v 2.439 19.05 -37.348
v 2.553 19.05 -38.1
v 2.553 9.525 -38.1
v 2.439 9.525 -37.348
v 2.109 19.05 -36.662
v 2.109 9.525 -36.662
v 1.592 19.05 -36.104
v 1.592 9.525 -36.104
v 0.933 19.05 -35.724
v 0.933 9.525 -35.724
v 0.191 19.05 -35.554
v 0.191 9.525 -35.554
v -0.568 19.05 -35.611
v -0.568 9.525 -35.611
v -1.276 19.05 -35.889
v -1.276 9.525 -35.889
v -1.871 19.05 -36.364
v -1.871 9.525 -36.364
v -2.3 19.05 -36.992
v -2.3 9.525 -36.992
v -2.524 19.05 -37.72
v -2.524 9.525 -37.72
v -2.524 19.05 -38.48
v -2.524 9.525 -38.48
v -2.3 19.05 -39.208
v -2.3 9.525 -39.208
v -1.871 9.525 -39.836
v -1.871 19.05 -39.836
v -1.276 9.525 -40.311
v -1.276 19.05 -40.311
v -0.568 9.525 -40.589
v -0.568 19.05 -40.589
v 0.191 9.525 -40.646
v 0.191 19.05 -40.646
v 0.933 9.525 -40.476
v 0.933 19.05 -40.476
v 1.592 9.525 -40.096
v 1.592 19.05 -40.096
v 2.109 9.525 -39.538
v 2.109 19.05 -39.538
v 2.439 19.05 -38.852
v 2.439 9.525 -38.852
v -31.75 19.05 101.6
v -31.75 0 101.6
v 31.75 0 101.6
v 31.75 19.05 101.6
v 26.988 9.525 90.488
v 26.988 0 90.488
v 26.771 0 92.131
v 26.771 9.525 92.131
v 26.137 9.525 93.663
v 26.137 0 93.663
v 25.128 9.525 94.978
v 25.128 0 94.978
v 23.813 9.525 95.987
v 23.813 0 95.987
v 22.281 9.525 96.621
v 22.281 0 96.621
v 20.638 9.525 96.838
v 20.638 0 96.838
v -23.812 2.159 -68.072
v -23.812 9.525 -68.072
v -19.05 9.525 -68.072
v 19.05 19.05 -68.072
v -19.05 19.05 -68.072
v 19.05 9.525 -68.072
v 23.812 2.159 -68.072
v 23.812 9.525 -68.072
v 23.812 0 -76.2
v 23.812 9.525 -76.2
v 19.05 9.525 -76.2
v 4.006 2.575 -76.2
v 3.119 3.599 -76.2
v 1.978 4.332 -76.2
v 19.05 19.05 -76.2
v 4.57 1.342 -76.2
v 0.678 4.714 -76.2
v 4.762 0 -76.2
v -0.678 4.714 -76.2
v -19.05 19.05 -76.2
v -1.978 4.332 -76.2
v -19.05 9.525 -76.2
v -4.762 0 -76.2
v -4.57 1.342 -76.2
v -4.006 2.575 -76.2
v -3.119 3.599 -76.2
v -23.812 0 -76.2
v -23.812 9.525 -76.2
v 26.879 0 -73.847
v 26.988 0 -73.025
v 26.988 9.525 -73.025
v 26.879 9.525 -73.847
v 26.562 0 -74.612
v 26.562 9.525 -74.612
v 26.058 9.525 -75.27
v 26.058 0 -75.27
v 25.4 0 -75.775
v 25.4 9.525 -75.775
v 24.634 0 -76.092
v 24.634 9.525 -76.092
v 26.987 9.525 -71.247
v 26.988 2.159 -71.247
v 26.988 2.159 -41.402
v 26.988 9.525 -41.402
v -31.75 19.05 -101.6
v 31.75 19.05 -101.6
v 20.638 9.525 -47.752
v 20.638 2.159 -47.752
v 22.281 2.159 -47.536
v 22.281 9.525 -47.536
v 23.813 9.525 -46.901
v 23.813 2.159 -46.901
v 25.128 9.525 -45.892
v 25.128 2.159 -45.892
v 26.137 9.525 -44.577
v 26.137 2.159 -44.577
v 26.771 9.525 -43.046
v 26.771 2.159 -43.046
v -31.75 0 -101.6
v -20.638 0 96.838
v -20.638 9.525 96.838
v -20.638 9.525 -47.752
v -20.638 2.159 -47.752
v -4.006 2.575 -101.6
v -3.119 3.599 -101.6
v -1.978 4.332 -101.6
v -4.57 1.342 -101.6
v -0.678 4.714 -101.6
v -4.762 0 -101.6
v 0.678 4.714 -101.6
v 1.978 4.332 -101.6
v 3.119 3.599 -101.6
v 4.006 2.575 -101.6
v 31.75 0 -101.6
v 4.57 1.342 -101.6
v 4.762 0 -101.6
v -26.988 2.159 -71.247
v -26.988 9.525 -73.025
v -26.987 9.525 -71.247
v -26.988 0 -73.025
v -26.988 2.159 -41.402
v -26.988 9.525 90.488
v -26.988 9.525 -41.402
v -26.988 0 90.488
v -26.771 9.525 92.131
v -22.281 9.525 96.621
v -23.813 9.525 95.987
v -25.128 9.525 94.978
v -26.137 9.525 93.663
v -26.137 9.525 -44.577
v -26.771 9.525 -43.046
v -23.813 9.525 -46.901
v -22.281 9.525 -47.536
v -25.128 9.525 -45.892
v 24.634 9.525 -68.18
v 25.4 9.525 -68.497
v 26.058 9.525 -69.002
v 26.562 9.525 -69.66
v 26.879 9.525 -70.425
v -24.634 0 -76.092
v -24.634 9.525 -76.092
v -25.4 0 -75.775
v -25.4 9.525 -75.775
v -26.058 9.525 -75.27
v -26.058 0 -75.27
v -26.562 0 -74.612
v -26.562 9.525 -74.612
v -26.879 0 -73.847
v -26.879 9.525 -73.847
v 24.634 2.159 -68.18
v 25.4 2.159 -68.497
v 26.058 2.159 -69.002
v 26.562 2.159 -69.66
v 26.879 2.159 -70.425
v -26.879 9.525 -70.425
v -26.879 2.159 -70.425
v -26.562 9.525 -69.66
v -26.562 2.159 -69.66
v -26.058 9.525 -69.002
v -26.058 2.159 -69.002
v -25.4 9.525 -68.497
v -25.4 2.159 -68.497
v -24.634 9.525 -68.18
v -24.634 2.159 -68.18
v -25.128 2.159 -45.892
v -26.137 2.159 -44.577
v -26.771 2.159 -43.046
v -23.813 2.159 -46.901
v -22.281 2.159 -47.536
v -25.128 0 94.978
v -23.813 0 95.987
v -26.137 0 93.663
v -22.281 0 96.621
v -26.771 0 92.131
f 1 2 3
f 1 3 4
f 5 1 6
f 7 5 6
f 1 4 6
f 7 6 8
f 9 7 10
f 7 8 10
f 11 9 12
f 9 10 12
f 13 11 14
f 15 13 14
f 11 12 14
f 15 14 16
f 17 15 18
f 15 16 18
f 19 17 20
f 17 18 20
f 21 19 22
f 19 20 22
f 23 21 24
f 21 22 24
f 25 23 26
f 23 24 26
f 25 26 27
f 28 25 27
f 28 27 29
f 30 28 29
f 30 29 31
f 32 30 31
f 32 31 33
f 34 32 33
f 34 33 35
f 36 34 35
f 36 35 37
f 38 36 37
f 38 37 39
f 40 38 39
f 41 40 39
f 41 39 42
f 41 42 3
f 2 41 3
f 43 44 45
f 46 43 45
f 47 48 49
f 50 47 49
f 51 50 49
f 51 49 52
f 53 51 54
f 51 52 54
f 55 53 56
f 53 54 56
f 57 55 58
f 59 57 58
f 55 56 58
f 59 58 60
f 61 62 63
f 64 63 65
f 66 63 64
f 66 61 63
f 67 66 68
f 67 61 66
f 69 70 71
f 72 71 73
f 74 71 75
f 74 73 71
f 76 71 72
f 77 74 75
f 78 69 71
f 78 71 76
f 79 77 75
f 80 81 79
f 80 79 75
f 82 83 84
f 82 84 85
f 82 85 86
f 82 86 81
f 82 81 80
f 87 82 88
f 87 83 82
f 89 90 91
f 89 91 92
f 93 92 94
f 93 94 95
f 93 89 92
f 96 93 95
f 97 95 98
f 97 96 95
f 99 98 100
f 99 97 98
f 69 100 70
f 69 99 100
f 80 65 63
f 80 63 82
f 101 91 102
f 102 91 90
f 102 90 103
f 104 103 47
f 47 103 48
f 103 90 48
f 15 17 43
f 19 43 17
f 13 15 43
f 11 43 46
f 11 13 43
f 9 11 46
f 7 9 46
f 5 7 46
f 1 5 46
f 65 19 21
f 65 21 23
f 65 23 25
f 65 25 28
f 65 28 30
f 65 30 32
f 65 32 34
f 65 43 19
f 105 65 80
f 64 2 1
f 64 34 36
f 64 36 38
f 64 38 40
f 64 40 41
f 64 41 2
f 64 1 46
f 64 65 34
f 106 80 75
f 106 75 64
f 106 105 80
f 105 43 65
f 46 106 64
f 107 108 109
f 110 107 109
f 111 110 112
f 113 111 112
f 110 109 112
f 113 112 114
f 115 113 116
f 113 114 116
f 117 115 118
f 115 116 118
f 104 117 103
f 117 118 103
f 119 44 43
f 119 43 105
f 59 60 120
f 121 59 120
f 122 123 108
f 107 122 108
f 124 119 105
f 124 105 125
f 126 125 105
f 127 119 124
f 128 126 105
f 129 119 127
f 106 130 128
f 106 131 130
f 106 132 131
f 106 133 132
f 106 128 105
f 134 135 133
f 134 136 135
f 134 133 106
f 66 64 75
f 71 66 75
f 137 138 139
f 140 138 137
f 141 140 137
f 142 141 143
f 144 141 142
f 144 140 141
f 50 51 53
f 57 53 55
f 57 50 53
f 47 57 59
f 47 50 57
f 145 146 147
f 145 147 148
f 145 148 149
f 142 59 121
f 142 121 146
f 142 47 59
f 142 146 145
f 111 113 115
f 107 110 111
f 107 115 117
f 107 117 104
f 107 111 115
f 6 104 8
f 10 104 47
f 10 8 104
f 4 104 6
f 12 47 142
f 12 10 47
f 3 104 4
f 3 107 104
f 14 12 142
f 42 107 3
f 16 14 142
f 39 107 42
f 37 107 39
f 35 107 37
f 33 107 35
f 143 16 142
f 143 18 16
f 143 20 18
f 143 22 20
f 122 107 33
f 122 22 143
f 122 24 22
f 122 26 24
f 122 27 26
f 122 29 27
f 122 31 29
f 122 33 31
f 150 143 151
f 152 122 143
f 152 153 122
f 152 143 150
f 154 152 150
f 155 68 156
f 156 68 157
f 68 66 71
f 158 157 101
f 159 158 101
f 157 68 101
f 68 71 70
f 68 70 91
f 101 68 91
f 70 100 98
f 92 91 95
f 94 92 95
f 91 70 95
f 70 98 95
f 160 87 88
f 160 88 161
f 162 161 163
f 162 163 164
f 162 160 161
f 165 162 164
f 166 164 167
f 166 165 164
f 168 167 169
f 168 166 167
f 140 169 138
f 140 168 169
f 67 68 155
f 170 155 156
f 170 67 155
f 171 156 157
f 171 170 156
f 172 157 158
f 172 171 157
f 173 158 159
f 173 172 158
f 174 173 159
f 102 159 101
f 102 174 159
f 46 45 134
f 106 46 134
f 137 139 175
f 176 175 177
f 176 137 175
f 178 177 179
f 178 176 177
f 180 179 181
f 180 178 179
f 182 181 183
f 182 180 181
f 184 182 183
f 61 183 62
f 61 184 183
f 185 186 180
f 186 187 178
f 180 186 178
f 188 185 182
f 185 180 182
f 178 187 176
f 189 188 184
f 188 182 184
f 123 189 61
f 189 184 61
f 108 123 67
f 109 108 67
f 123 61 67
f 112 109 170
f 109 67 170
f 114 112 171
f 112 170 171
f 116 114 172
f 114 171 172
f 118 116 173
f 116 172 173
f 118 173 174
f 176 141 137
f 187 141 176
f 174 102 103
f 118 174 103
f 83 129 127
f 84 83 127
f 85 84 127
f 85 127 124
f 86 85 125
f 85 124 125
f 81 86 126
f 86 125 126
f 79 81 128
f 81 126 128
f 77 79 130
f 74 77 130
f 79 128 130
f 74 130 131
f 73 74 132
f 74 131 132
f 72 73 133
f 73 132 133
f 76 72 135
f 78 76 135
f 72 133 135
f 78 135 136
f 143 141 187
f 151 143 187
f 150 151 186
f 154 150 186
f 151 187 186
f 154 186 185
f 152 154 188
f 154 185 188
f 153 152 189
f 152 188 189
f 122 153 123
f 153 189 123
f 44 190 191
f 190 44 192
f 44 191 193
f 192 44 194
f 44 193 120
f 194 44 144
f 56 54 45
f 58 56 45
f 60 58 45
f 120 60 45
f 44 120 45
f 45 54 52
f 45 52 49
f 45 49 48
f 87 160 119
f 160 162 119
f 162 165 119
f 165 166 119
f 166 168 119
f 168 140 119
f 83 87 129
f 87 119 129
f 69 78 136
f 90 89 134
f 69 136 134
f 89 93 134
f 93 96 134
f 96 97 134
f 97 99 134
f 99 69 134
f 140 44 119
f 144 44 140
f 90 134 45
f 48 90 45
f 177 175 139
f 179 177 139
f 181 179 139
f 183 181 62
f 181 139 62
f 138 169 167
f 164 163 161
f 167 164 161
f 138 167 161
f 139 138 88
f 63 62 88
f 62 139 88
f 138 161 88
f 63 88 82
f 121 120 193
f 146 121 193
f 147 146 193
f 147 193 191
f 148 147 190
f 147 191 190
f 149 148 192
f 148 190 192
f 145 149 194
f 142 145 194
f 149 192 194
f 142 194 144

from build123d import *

# Parameters (mm, degrees)
SKETCH1_W                   = 63.5
SKETCH1_H                   = 203.2
BOSS_EXTRUDE1_DEPTH         = 19.05
SKETCH2_R                   = 4.7625
CUT_EXTRUDE1_DEPTH          = 25.4
CUT_EXTRUDE2_DEPTH          = 9.525
SKETCH5_W                   = 38.1
SKETCH5_H                   = 8.128
CUT_EXTRUDE4_DEPTH          = 109.136603424
SKETCH6_W                   = 53.975
SKETCH6_H                   = 29.845
CUT_EXTRUDE5_DEPTH          = 2.159
F_1_4_20_TAPPED_HOLE1_D     = 5.1054
F_1_4_20_TAPPED_HOLE1_DEPTH = 19.05
F_1_4_20_TAPPED_HOLE1_TIP   = 1.533816902


with BuildPart() as part:
    # Sketch1 → Boss-Extrude1 (new body)
    with BuildSketch(Plane(origin=(0, 0, 0), x_dir=(1, 0, 0), z_dir=(0, 1, 0))):
        Rectangle(SKETCH1_W, SKETCH1_H)
    extrude(amount=BOSS_EXTRUDE1_DEPTH)

    # Sketch2 → Cut-Extrude1 (cut)
    with BuildSketch(Plane(origin=(0, 0, -101.6), x_dir=(-1, 0, 0), z_dir=(0, 0, -1))):
        Circle(SKETCH2_R)
    extrude(amount=-CUT_EXTRUDE1_DEPTH, mode=Mode.SUBTRACT)

    # Sketch3 → Cut-Extrude2 (cut)
    with BuildSketch(Plane(origin=(0, 0, 0), x_dir=(-1, 0, 0), z_dir=(0, -1, 0))):
        with BuildLine():
            Line((-20.6375, -96.8375), (20.6375, -96.8375))
            ThreePointArc((20.6375, -96.8375), (25.127628061, -94.977628061), (26.9875, -90.4875))
            Line((26.9875, -90.4875), (26.9875, 41.402))
            ThreePointArc((26.9875, 41.402), (25.127628061, 45.892128061), (20.6375, 47.752))
            Line((20.6375, 47.752), (-20.6375, 47.752))
            ThreePointArc((-20.6375, 47.752), (-25.127628061, 45.892128061), (-26.9875, 41.402))
            Line((-26.9875, 41.402), (-26.9875, -90.4875))
            ThreePointArc((-26.9875, -90.4875), (-25.127628061, -94.977628061), (-20.6375, -96.8375))
        make_face()
        with BuildLine():
            Line((-23.8125, 76.2), (23.8125, 76.2))
            ThreePointArc((23.8125, 76.2), (26.05756403, 75.27006403), (26.9875, 73.025))
            Line((26.9875, 73.025), (26.9875, 71.247))
            ThreePointArc((26.9875, 71.247), (26.05756403, 69.00193597), (23.8125, 68.072))
            Line((23.8125, 68.072), (-23.8125, 68.072))
            ThreePointArc((-23.8125, 68.072), (-26.05756403, 69.00193597), (-26.9875, 71.247))
            Line((-26.9875, 71.247), (-26.9875, 73.025))
            ThreePointArc((-26.9875, 73.025), (-26.05756403, 75.27006403), (-23.8125, 76.2))
        make_face()
    extrude(amount=-CUT_EXTRUDE2_DEPTH, mode=Mode.SUBTRACT)

    # Sketch5 → Cut-Extrude4 (cut, through all)
    with BuildSketch(Plane(origin=(0, 0, 0), x_dir=(1, 0, 0), z_dir=(0, 1, 0))):
        with Locations((0, 72.136)):
            Rectangle(SKETCH5_W, SKETCH5_H)
    extrude(amount=CUT_EXTRUDE4_DEPTH, mode=Mode.SUBTRACT)

    # Sketch6 → Cut-Extrude5 (cut)
    with BuildSketch(Plane(origin=(0, 0, 0), x_dir=(1, 0, 0), z_dir=(0, 1, 0))):
        with Locations((0, 56.3245)):
            Rectangle(SKETCH6_W, SKETCH6_H)
    extrude(amount=CUT_EXTRUDE5_DEPTH, mode=Mode.SUBTRACT)

    # 1/4-20 Tapped Hole1
    with Locations(Plane(origin=(-11.034450397, 19.05, 14.547513529), x_dir=(-1, 0, 0), z_dir=(0, 1, 0))):
        with Locations((-11.034450397, -52.647513529)):
            Hole(F_1_4_20_TAPPED_HOLE1_D / 2, depth=F_1_4_20_TAPPED_HOLE1_DEPTH)
            with Locations((0, 0, -(F_1_4_20_TAPPED_HOLE1_DEPTH + F_1_4_20_TAPPED_HOLE1_TIP / 2))):  # 118° drill point
                Cone(0, F_1_4_20_TAPPED_HOLE1_D / 2, F_1_4_20_TAPPED_HOLE1_TIP, mode=Mode.SUBTRACT)


solid = part.part
